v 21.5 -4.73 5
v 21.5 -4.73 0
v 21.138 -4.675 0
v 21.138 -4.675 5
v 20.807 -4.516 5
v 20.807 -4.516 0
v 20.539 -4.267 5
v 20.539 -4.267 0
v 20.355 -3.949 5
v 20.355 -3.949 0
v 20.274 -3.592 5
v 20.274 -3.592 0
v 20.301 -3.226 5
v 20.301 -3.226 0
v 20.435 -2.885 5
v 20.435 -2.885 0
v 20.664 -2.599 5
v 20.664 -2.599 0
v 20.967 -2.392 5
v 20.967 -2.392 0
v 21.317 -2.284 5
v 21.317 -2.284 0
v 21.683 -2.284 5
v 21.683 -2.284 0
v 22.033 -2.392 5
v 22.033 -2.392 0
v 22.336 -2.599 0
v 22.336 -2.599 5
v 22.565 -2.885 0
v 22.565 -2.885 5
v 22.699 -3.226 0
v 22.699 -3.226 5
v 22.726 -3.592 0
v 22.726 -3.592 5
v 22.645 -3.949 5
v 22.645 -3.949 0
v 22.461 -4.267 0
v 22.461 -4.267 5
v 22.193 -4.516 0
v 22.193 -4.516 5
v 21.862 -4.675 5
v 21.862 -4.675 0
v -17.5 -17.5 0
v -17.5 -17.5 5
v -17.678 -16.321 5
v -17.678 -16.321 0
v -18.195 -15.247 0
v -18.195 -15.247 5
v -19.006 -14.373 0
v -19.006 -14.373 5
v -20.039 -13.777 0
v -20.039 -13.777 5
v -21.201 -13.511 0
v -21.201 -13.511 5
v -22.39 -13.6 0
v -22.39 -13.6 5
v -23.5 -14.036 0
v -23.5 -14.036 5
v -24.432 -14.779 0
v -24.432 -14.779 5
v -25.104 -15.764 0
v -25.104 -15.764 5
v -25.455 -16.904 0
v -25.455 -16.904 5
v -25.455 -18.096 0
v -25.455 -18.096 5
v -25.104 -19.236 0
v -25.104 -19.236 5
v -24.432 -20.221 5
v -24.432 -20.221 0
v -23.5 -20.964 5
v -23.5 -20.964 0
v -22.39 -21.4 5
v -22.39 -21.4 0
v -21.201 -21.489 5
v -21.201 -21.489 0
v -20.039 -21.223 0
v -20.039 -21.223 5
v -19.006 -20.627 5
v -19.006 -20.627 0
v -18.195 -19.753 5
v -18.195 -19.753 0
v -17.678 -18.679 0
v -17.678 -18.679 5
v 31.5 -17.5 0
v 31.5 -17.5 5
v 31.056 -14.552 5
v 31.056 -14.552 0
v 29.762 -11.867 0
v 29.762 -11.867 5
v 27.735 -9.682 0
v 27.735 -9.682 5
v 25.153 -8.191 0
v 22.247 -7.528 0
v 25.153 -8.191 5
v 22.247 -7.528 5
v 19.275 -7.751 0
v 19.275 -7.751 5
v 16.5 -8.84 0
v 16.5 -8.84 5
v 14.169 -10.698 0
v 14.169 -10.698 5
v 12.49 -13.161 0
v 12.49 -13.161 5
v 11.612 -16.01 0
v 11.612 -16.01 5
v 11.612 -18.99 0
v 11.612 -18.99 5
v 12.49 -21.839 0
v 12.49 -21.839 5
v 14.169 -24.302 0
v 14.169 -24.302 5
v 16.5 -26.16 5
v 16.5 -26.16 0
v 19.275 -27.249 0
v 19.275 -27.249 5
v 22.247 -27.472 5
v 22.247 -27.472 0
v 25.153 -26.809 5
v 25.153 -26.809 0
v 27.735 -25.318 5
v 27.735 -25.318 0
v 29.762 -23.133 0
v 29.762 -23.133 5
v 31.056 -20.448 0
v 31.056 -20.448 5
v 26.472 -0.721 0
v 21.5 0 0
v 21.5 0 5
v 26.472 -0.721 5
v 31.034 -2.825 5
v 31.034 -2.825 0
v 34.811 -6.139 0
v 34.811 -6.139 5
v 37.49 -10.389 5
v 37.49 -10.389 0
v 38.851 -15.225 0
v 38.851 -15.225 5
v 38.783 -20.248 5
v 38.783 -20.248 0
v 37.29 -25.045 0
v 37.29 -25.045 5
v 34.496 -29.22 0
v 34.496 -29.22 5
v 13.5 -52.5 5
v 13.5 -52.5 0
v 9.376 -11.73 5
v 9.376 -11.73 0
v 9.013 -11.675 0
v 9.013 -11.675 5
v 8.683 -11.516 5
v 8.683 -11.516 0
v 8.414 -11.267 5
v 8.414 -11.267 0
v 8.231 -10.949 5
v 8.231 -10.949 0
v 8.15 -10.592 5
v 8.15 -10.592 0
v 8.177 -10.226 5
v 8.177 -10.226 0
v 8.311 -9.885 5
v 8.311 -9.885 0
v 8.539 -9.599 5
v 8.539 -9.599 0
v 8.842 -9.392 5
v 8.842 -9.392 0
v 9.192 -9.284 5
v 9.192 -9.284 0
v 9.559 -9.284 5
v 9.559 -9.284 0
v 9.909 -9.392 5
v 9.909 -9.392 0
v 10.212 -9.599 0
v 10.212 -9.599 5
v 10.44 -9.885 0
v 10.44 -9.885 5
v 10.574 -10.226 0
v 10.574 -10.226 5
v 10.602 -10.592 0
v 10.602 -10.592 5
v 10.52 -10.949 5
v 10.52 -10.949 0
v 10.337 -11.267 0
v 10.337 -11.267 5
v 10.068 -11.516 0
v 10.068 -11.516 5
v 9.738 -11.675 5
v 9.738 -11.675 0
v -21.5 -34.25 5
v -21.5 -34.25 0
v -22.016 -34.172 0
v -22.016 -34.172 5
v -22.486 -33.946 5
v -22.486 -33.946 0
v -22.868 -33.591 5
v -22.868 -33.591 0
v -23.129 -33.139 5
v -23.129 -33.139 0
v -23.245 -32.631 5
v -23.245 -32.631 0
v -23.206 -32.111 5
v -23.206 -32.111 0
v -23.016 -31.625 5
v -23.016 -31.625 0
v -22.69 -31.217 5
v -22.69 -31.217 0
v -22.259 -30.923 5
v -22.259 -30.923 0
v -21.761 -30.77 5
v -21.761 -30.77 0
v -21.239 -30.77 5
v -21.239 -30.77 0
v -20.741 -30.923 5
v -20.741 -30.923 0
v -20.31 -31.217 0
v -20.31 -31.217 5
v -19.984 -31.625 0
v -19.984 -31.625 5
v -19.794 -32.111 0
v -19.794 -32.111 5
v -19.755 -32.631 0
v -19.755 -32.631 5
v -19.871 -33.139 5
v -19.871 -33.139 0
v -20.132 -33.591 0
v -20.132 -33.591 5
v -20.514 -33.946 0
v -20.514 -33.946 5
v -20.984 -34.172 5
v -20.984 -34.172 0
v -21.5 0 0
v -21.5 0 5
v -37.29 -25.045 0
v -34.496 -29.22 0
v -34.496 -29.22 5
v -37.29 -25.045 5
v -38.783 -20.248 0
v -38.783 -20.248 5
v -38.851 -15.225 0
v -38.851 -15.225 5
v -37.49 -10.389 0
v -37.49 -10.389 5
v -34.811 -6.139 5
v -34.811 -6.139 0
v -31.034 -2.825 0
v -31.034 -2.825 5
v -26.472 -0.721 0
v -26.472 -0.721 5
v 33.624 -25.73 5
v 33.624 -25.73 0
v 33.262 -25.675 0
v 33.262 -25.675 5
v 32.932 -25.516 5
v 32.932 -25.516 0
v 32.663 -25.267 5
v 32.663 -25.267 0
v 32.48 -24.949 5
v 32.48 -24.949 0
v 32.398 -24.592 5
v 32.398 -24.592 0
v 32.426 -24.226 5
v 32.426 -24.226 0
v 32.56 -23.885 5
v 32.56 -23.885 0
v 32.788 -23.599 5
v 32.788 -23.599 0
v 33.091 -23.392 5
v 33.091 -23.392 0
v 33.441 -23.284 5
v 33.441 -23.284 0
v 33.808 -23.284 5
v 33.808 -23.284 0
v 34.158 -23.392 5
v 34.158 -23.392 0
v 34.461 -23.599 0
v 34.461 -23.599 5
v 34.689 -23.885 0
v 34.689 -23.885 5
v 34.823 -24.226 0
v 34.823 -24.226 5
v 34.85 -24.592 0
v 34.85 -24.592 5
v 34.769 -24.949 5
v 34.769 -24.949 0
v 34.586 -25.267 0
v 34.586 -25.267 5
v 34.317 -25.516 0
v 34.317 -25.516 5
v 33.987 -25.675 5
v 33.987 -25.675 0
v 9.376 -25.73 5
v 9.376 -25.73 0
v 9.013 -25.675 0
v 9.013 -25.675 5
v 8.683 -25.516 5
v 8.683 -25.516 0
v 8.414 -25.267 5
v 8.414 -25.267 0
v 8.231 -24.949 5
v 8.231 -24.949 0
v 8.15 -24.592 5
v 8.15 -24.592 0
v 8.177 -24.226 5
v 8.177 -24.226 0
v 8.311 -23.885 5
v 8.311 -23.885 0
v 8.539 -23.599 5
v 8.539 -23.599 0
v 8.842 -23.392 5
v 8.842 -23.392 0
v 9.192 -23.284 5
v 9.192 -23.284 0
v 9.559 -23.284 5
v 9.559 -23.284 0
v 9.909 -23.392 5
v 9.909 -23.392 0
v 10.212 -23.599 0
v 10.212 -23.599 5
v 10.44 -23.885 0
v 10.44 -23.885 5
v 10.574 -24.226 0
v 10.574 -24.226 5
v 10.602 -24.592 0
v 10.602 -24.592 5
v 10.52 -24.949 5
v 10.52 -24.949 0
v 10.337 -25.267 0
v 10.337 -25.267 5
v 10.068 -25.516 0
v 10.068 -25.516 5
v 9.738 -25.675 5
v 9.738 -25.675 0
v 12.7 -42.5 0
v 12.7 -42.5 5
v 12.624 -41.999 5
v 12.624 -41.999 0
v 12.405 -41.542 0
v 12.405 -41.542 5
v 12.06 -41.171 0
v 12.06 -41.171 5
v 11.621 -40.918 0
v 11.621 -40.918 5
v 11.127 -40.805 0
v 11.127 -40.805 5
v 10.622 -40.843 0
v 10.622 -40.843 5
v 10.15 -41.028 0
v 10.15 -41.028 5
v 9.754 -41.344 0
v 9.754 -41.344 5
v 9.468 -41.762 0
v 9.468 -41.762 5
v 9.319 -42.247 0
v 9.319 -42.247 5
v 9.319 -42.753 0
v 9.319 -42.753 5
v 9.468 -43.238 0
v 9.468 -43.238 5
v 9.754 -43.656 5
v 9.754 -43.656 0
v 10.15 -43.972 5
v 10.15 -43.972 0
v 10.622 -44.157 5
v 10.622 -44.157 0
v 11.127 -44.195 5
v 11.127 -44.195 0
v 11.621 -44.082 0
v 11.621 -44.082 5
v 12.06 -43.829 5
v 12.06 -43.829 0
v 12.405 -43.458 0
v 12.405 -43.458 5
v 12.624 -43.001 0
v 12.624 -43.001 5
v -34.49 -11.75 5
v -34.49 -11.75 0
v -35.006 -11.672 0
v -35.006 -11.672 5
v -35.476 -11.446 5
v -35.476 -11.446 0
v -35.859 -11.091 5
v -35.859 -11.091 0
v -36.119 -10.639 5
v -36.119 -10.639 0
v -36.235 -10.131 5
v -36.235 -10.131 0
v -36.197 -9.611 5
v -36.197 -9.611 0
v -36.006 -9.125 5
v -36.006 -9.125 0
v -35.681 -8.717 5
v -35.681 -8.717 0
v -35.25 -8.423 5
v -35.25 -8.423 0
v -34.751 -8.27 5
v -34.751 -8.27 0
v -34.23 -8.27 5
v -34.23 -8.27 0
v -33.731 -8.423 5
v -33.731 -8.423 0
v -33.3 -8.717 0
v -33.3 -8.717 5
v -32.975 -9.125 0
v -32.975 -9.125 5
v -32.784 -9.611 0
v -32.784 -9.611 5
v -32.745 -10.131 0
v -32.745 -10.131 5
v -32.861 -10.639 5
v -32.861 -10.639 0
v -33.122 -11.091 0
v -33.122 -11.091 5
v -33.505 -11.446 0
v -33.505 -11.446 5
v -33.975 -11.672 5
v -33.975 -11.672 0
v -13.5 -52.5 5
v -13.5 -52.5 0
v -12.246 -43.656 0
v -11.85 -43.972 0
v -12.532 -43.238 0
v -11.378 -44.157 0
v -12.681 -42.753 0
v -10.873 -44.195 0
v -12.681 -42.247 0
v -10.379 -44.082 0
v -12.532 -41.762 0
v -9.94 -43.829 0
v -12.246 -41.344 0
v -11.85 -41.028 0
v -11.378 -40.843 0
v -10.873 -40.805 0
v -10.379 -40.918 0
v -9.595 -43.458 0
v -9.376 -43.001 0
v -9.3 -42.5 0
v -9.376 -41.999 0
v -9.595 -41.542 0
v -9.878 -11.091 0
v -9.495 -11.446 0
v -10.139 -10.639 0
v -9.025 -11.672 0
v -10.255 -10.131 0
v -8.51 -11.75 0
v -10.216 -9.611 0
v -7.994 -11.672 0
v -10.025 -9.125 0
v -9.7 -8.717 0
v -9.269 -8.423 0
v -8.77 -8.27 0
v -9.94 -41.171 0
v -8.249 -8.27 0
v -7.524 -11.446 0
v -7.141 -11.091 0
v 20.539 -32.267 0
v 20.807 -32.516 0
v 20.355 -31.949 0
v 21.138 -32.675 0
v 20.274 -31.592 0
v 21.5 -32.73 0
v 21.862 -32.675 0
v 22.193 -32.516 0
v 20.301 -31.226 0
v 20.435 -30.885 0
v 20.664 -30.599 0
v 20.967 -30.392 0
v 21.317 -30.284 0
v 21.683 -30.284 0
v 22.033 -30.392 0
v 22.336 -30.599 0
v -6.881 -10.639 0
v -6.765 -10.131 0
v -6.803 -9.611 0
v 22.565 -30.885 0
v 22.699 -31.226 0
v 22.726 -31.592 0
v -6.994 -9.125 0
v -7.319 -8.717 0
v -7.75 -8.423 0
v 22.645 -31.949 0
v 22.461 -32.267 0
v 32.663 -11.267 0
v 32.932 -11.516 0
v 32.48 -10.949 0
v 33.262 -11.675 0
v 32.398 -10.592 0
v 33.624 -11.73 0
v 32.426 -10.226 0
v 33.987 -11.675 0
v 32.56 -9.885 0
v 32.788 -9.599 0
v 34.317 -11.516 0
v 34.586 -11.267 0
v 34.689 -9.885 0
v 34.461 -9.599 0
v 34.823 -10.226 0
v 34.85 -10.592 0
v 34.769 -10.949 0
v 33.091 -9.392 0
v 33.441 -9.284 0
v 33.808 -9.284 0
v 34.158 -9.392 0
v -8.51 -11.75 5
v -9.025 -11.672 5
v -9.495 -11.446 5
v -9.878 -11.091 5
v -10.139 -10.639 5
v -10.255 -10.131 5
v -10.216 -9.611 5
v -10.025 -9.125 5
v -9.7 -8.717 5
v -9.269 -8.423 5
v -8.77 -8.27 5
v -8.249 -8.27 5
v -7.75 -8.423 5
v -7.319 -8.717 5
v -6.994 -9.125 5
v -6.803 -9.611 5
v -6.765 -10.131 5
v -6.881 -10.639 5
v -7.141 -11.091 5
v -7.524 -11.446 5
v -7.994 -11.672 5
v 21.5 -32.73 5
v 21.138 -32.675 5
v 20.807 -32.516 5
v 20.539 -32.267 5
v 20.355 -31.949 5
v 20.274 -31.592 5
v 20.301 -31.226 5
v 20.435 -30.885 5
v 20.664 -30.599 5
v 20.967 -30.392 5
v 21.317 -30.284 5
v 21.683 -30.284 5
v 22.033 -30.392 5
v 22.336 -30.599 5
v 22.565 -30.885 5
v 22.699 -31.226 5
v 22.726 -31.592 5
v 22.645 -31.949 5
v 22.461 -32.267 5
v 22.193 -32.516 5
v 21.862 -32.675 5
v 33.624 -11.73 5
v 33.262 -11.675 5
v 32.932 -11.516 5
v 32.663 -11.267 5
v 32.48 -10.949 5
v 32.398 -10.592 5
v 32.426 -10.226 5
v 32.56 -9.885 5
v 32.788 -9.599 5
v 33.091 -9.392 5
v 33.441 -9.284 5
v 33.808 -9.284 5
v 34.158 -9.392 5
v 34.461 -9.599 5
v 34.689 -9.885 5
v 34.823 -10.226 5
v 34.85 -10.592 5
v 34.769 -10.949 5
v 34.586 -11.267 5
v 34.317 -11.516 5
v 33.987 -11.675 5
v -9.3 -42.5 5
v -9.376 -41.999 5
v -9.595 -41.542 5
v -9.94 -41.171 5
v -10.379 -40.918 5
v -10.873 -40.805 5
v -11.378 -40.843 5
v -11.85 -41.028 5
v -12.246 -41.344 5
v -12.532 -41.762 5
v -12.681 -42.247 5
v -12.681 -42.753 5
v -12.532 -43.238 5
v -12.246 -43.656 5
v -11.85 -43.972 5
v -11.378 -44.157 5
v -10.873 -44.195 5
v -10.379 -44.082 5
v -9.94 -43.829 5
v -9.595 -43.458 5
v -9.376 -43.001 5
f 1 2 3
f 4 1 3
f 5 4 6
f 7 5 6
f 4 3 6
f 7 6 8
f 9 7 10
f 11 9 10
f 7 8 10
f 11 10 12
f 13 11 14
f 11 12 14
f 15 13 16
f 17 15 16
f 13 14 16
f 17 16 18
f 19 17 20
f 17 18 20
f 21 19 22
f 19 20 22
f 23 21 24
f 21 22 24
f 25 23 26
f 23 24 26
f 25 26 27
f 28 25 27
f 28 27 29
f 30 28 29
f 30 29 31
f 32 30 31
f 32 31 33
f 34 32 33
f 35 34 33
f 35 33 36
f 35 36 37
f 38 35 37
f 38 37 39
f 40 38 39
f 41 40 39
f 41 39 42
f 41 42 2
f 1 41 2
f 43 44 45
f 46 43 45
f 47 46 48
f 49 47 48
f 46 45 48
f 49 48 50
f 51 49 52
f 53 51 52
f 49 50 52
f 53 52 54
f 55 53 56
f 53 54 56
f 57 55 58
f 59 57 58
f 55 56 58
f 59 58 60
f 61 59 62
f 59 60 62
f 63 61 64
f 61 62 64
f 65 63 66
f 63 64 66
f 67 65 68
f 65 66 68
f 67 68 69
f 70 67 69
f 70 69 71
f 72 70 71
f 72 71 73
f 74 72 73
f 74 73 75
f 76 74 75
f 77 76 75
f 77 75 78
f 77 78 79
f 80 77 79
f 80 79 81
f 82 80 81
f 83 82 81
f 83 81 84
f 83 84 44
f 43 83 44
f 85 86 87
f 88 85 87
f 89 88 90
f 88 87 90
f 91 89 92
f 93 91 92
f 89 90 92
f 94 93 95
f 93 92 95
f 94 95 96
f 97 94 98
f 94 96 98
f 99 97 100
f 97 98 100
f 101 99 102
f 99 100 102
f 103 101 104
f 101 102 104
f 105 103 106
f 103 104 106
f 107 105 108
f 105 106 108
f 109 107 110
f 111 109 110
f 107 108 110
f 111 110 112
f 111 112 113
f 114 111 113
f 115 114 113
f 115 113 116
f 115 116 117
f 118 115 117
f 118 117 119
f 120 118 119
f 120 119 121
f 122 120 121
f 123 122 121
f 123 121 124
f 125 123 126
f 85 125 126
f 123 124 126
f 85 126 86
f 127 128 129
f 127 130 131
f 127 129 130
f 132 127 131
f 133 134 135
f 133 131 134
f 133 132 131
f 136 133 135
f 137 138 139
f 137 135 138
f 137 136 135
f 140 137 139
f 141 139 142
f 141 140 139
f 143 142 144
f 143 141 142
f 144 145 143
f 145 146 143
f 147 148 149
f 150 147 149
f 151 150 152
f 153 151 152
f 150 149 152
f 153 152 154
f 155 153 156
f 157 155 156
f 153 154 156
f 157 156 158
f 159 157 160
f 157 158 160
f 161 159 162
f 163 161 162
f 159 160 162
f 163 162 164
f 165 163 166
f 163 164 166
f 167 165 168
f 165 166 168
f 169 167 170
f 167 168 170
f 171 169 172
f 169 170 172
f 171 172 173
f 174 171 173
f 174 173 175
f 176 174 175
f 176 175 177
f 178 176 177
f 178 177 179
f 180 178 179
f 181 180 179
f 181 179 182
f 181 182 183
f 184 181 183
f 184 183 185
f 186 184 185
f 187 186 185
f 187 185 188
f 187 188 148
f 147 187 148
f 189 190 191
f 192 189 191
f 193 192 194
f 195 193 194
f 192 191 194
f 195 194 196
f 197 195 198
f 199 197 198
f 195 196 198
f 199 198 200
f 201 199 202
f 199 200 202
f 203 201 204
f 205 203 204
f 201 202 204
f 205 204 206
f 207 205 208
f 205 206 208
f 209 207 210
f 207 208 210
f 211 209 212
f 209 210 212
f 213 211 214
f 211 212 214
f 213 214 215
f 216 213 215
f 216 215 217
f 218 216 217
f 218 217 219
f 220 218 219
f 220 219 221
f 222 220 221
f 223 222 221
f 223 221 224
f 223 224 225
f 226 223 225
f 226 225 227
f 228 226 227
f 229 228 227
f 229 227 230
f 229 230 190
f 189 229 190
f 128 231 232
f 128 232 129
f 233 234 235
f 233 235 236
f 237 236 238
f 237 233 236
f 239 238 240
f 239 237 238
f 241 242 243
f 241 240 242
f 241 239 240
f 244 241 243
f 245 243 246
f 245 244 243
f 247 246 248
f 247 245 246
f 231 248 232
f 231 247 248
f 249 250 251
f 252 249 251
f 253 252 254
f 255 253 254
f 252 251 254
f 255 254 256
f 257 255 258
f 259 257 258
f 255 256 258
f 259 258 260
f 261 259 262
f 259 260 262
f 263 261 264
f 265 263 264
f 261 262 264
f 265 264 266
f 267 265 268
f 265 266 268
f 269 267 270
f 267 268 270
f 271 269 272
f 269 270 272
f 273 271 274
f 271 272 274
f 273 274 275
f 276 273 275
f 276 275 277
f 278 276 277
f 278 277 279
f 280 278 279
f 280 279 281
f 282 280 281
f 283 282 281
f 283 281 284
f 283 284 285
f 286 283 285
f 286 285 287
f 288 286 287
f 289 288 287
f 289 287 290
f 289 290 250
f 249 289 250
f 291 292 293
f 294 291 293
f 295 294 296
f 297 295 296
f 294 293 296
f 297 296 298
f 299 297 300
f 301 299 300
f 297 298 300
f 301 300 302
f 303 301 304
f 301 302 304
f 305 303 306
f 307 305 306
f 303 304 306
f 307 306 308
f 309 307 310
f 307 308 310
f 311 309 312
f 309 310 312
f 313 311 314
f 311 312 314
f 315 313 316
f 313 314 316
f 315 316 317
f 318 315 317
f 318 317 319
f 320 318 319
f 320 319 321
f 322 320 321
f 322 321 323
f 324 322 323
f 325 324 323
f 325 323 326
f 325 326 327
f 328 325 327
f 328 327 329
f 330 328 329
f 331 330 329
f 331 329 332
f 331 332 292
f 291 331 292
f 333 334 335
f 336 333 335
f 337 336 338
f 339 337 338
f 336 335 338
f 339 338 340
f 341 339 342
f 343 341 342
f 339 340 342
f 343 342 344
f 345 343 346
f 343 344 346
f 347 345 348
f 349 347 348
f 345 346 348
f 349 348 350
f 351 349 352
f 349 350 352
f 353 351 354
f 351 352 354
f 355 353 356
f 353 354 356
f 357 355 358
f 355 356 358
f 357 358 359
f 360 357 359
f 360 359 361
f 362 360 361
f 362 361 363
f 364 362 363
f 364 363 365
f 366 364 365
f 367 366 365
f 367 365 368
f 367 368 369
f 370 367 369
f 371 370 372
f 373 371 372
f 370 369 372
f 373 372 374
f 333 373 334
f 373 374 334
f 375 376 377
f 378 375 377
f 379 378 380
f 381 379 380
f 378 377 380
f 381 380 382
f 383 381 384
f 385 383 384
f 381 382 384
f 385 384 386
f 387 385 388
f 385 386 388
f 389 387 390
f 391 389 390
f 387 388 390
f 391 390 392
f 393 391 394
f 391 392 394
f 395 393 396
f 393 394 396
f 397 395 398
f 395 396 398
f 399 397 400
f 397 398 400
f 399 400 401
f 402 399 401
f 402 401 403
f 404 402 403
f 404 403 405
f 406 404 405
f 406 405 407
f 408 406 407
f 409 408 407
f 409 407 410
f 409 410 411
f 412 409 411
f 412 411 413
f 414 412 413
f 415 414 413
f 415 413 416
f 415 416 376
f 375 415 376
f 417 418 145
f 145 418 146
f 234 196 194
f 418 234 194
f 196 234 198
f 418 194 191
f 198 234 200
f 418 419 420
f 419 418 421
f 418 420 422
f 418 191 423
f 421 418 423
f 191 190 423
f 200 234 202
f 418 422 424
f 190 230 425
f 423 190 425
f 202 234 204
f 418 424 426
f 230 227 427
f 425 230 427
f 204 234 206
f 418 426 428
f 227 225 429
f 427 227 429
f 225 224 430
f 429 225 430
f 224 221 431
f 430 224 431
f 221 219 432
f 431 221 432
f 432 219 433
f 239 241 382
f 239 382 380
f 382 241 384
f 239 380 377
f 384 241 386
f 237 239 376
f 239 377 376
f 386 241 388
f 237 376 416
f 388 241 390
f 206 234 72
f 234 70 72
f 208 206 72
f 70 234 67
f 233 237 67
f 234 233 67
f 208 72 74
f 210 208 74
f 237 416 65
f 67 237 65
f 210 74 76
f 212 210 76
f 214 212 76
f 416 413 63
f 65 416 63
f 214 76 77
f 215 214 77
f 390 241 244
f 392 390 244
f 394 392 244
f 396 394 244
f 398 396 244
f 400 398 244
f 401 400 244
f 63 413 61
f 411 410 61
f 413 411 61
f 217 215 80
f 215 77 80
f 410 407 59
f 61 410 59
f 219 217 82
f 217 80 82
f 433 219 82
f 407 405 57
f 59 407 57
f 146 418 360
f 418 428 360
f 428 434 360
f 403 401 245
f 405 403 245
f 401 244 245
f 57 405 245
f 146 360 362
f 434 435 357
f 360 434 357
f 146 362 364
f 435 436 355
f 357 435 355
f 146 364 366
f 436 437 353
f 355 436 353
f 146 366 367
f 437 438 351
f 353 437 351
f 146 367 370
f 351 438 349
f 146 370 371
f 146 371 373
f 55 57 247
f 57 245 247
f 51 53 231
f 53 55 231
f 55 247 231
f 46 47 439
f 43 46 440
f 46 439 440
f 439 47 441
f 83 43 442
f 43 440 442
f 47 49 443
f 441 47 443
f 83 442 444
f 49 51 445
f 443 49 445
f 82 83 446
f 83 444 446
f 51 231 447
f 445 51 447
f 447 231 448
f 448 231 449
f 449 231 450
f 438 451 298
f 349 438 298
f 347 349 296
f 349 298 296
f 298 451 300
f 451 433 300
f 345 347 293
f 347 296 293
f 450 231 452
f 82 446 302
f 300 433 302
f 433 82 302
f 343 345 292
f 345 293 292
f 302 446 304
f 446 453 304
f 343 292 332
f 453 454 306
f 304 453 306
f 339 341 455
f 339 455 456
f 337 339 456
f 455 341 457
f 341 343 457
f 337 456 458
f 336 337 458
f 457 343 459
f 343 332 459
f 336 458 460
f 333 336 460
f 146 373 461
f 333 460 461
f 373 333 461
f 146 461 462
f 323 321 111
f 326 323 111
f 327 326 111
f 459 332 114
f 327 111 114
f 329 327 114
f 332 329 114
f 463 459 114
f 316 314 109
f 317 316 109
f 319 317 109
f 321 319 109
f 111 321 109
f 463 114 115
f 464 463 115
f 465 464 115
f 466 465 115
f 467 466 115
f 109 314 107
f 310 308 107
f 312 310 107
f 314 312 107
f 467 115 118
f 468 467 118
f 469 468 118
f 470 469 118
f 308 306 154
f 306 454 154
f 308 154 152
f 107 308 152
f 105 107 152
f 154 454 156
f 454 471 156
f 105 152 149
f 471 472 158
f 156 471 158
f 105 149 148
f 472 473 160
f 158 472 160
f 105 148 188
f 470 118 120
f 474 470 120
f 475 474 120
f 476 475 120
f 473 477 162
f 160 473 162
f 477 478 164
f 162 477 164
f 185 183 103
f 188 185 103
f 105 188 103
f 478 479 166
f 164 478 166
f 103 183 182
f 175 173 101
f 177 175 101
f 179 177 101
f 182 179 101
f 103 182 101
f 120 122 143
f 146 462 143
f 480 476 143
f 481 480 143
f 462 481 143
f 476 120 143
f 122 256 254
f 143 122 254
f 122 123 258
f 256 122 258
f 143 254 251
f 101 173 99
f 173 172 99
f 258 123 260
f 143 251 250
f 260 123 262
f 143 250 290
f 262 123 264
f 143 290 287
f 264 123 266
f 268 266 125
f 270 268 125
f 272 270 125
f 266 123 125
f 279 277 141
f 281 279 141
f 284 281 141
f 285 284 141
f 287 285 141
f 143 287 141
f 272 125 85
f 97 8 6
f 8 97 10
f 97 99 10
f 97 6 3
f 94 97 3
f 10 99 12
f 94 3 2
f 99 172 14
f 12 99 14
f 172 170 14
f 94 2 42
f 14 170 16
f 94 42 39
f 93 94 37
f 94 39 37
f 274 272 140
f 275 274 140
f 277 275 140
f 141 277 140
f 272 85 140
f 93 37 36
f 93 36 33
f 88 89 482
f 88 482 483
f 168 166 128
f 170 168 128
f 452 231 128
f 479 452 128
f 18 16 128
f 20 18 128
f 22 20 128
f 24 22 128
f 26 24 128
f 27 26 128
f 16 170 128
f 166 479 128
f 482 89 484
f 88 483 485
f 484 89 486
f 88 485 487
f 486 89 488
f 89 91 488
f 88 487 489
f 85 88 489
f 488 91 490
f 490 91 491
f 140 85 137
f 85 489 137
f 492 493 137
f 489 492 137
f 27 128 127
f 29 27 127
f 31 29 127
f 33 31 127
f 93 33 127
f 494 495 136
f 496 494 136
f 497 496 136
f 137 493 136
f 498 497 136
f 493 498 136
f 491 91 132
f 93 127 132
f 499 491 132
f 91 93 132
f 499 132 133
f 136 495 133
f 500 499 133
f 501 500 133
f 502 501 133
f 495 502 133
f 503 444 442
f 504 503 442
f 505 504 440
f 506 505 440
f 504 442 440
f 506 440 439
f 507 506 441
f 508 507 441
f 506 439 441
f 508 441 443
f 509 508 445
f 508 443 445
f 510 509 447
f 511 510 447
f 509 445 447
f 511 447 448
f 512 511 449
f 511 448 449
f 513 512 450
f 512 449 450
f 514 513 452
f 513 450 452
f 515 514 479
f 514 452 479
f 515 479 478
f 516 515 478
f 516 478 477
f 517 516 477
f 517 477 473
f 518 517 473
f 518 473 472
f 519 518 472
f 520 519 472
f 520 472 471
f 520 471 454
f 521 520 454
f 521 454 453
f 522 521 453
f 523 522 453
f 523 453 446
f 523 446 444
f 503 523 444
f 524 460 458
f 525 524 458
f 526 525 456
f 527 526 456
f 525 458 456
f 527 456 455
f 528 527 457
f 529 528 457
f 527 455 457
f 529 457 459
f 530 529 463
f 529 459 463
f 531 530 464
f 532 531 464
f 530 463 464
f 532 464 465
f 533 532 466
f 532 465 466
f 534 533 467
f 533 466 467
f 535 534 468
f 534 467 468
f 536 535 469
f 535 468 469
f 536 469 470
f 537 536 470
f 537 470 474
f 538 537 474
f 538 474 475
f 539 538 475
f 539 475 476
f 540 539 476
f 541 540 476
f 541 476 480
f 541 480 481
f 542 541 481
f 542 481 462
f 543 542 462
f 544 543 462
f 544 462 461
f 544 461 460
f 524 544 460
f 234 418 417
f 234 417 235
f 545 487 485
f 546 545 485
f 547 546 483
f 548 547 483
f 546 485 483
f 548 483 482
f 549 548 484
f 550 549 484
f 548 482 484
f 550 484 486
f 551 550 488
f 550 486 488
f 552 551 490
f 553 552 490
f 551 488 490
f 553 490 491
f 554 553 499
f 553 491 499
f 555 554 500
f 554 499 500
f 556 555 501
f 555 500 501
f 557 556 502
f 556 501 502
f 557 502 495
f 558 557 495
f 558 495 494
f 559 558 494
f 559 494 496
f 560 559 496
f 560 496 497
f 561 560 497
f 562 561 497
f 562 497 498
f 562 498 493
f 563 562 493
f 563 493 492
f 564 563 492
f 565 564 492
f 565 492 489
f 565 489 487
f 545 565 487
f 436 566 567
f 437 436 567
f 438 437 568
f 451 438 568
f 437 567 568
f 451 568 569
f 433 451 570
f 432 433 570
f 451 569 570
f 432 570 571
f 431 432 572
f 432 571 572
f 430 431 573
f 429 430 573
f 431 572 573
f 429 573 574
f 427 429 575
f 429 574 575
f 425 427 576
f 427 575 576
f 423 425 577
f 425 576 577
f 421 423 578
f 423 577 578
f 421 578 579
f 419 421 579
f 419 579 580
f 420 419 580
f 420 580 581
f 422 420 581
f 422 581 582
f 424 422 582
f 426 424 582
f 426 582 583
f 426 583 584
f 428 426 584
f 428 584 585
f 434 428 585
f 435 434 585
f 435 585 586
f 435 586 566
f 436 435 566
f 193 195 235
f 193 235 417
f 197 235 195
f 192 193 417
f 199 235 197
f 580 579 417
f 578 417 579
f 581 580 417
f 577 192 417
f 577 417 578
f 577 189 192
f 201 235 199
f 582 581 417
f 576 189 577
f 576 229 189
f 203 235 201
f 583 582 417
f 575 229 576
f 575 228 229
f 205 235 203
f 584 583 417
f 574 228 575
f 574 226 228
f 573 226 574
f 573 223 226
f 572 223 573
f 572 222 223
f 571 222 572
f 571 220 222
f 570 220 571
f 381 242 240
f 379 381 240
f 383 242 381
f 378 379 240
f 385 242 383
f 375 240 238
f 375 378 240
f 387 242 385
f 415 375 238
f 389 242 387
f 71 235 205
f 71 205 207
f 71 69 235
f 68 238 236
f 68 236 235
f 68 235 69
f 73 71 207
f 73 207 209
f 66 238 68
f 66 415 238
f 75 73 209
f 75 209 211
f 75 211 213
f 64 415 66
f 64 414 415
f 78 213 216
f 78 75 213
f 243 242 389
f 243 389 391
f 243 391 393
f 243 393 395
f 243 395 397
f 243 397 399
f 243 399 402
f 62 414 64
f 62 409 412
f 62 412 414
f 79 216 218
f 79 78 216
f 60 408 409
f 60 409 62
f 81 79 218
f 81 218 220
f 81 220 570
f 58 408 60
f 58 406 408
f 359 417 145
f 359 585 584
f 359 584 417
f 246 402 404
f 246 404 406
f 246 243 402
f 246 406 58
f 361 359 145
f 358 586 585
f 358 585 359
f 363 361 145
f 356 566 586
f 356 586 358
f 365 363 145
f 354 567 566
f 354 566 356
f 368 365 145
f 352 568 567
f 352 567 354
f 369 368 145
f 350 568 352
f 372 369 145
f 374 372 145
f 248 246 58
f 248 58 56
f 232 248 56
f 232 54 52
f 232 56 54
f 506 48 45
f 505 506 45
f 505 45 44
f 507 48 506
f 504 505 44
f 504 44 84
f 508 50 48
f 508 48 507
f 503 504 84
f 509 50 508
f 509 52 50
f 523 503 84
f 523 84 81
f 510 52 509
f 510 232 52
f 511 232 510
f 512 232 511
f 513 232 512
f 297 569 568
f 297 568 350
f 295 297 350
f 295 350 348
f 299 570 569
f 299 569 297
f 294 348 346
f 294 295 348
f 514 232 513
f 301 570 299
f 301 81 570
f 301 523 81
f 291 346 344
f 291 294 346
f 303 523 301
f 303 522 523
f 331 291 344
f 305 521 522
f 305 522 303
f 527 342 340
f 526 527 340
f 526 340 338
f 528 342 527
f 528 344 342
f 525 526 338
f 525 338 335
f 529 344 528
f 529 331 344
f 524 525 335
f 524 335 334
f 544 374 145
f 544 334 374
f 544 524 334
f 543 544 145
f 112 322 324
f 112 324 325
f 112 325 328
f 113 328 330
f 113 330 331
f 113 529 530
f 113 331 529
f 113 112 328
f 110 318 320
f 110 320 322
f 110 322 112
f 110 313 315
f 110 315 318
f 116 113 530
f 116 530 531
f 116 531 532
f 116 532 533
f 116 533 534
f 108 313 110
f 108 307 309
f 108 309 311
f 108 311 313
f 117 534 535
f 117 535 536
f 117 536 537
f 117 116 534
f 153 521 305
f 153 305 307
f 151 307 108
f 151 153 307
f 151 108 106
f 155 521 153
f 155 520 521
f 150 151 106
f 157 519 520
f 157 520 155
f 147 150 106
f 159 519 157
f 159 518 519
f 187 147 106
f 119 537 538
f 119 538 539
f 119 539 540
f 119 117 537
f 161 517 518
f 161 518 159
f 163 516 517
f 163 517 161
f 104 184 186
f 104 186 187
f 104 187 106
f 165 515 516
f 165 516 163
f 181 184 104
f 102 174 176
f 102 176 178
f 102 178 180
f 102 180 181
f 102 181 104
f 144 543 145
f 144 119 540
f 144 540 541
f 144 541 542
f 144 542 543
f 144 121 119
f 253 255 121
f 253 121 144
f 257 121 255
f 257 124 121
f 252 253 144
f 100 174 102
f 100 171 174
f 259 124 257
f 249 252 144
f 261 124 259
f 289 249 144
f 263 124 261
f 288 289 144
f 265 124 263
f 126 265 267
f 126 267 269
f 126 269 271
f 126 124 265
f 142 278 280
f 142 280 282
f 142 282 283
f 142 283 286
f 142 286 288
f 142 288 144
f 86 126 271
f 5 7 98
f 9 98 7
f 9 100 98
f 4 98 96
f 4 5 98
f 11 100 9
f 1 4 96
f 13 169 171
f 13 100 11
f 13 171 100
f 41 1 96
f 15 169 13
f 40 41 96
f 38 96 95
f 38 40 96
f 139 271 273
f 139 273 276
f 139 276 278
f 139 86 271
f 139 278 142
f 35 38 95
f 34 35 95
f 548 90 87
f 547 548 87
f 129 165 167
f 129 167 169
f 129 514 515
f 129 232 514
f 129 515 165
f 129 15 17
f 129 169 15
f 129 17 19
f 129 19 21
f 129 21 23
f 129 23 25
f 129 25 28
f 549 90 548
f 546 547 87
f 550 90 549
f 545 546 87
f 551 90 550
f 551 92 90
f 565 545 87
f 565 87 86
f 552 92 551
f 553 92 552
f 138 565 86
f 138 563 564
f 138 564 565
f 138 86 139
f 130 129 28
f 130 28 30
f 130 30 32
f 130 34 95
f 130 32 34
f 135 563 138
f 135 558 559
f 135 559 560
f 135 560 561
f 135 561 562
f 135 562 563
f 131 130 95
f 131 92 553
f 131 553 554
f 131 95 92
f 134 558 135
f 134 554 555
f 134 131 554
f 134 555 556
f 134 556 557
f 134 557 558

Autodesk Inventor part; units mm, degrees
ref_plane "YZ Plane" through (0, 0, 0) normal (1, 0, 0) x (0, 1, 0)
ref_plane "XZ Plane" through (0, 0, 0) normal (0, 1, 0) x (-1, 0, 0)
ref_plane "XY Plane" through (0, 0, 0) normal (0, 0, 1) x (1, 0, 0)
sketch "Skizze1" plane through (0, 0, 0) normal (0, 0, 1) x (1, 0, 0)
  line L0 (0, -63.8443) -> (0, 15.5659) projected
  line L1 (-61.5828, 0) -> (61.5828, 0) projected
  line L2 (-13.5, -52.5) -> (13.5, -52.5)
  line L3 (13.5, -52.5) -> (34.4955, -29.2204)
  line L4 (-13.5, -52.5) -> (-34.4955, -29.2204)
  arc A0 (-21.5, 0) -> (-34.4955, -29.2204) centre (-21.5, -17.5) ccw
  arc A1 (34.4955, -29.2204) -> (21.5, 0) centre (21.5, -17.5) ccw
  line L5 (-21.5, 0) -> (21.5, 0)
  point P0 (0, 0)
  dimension "d0" = 43
  dimension "d1" = 27
  dimension "d2" = 35
  dimension "d3" = 17.5
extrude "Extrusion1" add sketch "Skizze1" along normal blind 5
sketch "Skizze2" plane through (0, 0, 5) normal (0, 0, 1) x (1, 0, 0)
  line L0 (-61.5828, 0) -> (61.5828, 0) projected
  line L1 (0, -63.8443) -> (0, 15.5659) projected
  arc A0 (-21.5, 0) -> (-34.4955, -29.2204) centre (-21.5, -17.5) ccw projected
  circle A1 centre (-21.5, -17.5) radius 4
  arc A2 (34.4955, -29.2204) -> (21.5, 0) centre (21.5, -17.5) ccw projected
  circle A3 centre (21.5, -17.5) radius 10
  circle A4 centre (-11, -42.5) radius 1.7
  circle A5 centre (11, -42.5) radius 1.7
  line L2 (-13.5, -52.5) -> (13.5, -52.5) projected
  point P0 (0, 0)
  dimension "d7" = 8
  dimension "d8" = 20
  dimension "d9" = 3.4
  dimension "d10" = 3.4
  dimension "d11" = 10
  dimension "d12" = 22
extrude "Extrusion2" cut sketch "Skizze2" against normal up to next
sketch "Skizze3" plane through (0, 0, 5) normal (0, 0, 1) x (1, 0, 0)
  arc A0 (-21.5, 0) -> (-34.4955, -29.2204) centre (-21.5, -17.5) ccw construction
  circle A1 centre (-21.5, -17.5) radius 15 construction
  line L0 (-21.5, -2.5) -> (-21.5, -32.5) construction
  point P0 (0, 0)
  dimension "d15" = 30
hole "Bohrung1" at (-21.5, -32.5, 5) direction (0, 0, -1) diameter 3.5 end up to surface
pattern_circular "Runde Anordnung1" count 3 over 360 about axis through (-21.5, -17.5, 5) along (0, 0, -1) of "Bohrung1"
sketch "Skizze4" plane through (0, 0, 5) normal (0, 0, 1) x (1, 0, 0)
  arc A0 (34.4955, -29.2204) -> (21.5, 0) centre (21.5, -17.5) ccw construction
  circle A1 centre (21.5, -17.5) radius 14 construction
  line L0 (21.5, -3.5) -> (21.5, -31.5) construction
  point P0 (0, 0)
  dimension "d26" = 28
hole "Bohrung2" at (21.5, -31.5, 5) direction (0, 0, -1) diameter 2.459 end up to surface thread size "M3x0.5" class "6H" standard "ISO Metric profile"
pattern_circular "Runde Anordnung2" count 6 over 360 about axis through (21.5, -17.5, 5) along (0, 0, -1) of "Bohrung2"
properties part number "Zylinderplatte"
